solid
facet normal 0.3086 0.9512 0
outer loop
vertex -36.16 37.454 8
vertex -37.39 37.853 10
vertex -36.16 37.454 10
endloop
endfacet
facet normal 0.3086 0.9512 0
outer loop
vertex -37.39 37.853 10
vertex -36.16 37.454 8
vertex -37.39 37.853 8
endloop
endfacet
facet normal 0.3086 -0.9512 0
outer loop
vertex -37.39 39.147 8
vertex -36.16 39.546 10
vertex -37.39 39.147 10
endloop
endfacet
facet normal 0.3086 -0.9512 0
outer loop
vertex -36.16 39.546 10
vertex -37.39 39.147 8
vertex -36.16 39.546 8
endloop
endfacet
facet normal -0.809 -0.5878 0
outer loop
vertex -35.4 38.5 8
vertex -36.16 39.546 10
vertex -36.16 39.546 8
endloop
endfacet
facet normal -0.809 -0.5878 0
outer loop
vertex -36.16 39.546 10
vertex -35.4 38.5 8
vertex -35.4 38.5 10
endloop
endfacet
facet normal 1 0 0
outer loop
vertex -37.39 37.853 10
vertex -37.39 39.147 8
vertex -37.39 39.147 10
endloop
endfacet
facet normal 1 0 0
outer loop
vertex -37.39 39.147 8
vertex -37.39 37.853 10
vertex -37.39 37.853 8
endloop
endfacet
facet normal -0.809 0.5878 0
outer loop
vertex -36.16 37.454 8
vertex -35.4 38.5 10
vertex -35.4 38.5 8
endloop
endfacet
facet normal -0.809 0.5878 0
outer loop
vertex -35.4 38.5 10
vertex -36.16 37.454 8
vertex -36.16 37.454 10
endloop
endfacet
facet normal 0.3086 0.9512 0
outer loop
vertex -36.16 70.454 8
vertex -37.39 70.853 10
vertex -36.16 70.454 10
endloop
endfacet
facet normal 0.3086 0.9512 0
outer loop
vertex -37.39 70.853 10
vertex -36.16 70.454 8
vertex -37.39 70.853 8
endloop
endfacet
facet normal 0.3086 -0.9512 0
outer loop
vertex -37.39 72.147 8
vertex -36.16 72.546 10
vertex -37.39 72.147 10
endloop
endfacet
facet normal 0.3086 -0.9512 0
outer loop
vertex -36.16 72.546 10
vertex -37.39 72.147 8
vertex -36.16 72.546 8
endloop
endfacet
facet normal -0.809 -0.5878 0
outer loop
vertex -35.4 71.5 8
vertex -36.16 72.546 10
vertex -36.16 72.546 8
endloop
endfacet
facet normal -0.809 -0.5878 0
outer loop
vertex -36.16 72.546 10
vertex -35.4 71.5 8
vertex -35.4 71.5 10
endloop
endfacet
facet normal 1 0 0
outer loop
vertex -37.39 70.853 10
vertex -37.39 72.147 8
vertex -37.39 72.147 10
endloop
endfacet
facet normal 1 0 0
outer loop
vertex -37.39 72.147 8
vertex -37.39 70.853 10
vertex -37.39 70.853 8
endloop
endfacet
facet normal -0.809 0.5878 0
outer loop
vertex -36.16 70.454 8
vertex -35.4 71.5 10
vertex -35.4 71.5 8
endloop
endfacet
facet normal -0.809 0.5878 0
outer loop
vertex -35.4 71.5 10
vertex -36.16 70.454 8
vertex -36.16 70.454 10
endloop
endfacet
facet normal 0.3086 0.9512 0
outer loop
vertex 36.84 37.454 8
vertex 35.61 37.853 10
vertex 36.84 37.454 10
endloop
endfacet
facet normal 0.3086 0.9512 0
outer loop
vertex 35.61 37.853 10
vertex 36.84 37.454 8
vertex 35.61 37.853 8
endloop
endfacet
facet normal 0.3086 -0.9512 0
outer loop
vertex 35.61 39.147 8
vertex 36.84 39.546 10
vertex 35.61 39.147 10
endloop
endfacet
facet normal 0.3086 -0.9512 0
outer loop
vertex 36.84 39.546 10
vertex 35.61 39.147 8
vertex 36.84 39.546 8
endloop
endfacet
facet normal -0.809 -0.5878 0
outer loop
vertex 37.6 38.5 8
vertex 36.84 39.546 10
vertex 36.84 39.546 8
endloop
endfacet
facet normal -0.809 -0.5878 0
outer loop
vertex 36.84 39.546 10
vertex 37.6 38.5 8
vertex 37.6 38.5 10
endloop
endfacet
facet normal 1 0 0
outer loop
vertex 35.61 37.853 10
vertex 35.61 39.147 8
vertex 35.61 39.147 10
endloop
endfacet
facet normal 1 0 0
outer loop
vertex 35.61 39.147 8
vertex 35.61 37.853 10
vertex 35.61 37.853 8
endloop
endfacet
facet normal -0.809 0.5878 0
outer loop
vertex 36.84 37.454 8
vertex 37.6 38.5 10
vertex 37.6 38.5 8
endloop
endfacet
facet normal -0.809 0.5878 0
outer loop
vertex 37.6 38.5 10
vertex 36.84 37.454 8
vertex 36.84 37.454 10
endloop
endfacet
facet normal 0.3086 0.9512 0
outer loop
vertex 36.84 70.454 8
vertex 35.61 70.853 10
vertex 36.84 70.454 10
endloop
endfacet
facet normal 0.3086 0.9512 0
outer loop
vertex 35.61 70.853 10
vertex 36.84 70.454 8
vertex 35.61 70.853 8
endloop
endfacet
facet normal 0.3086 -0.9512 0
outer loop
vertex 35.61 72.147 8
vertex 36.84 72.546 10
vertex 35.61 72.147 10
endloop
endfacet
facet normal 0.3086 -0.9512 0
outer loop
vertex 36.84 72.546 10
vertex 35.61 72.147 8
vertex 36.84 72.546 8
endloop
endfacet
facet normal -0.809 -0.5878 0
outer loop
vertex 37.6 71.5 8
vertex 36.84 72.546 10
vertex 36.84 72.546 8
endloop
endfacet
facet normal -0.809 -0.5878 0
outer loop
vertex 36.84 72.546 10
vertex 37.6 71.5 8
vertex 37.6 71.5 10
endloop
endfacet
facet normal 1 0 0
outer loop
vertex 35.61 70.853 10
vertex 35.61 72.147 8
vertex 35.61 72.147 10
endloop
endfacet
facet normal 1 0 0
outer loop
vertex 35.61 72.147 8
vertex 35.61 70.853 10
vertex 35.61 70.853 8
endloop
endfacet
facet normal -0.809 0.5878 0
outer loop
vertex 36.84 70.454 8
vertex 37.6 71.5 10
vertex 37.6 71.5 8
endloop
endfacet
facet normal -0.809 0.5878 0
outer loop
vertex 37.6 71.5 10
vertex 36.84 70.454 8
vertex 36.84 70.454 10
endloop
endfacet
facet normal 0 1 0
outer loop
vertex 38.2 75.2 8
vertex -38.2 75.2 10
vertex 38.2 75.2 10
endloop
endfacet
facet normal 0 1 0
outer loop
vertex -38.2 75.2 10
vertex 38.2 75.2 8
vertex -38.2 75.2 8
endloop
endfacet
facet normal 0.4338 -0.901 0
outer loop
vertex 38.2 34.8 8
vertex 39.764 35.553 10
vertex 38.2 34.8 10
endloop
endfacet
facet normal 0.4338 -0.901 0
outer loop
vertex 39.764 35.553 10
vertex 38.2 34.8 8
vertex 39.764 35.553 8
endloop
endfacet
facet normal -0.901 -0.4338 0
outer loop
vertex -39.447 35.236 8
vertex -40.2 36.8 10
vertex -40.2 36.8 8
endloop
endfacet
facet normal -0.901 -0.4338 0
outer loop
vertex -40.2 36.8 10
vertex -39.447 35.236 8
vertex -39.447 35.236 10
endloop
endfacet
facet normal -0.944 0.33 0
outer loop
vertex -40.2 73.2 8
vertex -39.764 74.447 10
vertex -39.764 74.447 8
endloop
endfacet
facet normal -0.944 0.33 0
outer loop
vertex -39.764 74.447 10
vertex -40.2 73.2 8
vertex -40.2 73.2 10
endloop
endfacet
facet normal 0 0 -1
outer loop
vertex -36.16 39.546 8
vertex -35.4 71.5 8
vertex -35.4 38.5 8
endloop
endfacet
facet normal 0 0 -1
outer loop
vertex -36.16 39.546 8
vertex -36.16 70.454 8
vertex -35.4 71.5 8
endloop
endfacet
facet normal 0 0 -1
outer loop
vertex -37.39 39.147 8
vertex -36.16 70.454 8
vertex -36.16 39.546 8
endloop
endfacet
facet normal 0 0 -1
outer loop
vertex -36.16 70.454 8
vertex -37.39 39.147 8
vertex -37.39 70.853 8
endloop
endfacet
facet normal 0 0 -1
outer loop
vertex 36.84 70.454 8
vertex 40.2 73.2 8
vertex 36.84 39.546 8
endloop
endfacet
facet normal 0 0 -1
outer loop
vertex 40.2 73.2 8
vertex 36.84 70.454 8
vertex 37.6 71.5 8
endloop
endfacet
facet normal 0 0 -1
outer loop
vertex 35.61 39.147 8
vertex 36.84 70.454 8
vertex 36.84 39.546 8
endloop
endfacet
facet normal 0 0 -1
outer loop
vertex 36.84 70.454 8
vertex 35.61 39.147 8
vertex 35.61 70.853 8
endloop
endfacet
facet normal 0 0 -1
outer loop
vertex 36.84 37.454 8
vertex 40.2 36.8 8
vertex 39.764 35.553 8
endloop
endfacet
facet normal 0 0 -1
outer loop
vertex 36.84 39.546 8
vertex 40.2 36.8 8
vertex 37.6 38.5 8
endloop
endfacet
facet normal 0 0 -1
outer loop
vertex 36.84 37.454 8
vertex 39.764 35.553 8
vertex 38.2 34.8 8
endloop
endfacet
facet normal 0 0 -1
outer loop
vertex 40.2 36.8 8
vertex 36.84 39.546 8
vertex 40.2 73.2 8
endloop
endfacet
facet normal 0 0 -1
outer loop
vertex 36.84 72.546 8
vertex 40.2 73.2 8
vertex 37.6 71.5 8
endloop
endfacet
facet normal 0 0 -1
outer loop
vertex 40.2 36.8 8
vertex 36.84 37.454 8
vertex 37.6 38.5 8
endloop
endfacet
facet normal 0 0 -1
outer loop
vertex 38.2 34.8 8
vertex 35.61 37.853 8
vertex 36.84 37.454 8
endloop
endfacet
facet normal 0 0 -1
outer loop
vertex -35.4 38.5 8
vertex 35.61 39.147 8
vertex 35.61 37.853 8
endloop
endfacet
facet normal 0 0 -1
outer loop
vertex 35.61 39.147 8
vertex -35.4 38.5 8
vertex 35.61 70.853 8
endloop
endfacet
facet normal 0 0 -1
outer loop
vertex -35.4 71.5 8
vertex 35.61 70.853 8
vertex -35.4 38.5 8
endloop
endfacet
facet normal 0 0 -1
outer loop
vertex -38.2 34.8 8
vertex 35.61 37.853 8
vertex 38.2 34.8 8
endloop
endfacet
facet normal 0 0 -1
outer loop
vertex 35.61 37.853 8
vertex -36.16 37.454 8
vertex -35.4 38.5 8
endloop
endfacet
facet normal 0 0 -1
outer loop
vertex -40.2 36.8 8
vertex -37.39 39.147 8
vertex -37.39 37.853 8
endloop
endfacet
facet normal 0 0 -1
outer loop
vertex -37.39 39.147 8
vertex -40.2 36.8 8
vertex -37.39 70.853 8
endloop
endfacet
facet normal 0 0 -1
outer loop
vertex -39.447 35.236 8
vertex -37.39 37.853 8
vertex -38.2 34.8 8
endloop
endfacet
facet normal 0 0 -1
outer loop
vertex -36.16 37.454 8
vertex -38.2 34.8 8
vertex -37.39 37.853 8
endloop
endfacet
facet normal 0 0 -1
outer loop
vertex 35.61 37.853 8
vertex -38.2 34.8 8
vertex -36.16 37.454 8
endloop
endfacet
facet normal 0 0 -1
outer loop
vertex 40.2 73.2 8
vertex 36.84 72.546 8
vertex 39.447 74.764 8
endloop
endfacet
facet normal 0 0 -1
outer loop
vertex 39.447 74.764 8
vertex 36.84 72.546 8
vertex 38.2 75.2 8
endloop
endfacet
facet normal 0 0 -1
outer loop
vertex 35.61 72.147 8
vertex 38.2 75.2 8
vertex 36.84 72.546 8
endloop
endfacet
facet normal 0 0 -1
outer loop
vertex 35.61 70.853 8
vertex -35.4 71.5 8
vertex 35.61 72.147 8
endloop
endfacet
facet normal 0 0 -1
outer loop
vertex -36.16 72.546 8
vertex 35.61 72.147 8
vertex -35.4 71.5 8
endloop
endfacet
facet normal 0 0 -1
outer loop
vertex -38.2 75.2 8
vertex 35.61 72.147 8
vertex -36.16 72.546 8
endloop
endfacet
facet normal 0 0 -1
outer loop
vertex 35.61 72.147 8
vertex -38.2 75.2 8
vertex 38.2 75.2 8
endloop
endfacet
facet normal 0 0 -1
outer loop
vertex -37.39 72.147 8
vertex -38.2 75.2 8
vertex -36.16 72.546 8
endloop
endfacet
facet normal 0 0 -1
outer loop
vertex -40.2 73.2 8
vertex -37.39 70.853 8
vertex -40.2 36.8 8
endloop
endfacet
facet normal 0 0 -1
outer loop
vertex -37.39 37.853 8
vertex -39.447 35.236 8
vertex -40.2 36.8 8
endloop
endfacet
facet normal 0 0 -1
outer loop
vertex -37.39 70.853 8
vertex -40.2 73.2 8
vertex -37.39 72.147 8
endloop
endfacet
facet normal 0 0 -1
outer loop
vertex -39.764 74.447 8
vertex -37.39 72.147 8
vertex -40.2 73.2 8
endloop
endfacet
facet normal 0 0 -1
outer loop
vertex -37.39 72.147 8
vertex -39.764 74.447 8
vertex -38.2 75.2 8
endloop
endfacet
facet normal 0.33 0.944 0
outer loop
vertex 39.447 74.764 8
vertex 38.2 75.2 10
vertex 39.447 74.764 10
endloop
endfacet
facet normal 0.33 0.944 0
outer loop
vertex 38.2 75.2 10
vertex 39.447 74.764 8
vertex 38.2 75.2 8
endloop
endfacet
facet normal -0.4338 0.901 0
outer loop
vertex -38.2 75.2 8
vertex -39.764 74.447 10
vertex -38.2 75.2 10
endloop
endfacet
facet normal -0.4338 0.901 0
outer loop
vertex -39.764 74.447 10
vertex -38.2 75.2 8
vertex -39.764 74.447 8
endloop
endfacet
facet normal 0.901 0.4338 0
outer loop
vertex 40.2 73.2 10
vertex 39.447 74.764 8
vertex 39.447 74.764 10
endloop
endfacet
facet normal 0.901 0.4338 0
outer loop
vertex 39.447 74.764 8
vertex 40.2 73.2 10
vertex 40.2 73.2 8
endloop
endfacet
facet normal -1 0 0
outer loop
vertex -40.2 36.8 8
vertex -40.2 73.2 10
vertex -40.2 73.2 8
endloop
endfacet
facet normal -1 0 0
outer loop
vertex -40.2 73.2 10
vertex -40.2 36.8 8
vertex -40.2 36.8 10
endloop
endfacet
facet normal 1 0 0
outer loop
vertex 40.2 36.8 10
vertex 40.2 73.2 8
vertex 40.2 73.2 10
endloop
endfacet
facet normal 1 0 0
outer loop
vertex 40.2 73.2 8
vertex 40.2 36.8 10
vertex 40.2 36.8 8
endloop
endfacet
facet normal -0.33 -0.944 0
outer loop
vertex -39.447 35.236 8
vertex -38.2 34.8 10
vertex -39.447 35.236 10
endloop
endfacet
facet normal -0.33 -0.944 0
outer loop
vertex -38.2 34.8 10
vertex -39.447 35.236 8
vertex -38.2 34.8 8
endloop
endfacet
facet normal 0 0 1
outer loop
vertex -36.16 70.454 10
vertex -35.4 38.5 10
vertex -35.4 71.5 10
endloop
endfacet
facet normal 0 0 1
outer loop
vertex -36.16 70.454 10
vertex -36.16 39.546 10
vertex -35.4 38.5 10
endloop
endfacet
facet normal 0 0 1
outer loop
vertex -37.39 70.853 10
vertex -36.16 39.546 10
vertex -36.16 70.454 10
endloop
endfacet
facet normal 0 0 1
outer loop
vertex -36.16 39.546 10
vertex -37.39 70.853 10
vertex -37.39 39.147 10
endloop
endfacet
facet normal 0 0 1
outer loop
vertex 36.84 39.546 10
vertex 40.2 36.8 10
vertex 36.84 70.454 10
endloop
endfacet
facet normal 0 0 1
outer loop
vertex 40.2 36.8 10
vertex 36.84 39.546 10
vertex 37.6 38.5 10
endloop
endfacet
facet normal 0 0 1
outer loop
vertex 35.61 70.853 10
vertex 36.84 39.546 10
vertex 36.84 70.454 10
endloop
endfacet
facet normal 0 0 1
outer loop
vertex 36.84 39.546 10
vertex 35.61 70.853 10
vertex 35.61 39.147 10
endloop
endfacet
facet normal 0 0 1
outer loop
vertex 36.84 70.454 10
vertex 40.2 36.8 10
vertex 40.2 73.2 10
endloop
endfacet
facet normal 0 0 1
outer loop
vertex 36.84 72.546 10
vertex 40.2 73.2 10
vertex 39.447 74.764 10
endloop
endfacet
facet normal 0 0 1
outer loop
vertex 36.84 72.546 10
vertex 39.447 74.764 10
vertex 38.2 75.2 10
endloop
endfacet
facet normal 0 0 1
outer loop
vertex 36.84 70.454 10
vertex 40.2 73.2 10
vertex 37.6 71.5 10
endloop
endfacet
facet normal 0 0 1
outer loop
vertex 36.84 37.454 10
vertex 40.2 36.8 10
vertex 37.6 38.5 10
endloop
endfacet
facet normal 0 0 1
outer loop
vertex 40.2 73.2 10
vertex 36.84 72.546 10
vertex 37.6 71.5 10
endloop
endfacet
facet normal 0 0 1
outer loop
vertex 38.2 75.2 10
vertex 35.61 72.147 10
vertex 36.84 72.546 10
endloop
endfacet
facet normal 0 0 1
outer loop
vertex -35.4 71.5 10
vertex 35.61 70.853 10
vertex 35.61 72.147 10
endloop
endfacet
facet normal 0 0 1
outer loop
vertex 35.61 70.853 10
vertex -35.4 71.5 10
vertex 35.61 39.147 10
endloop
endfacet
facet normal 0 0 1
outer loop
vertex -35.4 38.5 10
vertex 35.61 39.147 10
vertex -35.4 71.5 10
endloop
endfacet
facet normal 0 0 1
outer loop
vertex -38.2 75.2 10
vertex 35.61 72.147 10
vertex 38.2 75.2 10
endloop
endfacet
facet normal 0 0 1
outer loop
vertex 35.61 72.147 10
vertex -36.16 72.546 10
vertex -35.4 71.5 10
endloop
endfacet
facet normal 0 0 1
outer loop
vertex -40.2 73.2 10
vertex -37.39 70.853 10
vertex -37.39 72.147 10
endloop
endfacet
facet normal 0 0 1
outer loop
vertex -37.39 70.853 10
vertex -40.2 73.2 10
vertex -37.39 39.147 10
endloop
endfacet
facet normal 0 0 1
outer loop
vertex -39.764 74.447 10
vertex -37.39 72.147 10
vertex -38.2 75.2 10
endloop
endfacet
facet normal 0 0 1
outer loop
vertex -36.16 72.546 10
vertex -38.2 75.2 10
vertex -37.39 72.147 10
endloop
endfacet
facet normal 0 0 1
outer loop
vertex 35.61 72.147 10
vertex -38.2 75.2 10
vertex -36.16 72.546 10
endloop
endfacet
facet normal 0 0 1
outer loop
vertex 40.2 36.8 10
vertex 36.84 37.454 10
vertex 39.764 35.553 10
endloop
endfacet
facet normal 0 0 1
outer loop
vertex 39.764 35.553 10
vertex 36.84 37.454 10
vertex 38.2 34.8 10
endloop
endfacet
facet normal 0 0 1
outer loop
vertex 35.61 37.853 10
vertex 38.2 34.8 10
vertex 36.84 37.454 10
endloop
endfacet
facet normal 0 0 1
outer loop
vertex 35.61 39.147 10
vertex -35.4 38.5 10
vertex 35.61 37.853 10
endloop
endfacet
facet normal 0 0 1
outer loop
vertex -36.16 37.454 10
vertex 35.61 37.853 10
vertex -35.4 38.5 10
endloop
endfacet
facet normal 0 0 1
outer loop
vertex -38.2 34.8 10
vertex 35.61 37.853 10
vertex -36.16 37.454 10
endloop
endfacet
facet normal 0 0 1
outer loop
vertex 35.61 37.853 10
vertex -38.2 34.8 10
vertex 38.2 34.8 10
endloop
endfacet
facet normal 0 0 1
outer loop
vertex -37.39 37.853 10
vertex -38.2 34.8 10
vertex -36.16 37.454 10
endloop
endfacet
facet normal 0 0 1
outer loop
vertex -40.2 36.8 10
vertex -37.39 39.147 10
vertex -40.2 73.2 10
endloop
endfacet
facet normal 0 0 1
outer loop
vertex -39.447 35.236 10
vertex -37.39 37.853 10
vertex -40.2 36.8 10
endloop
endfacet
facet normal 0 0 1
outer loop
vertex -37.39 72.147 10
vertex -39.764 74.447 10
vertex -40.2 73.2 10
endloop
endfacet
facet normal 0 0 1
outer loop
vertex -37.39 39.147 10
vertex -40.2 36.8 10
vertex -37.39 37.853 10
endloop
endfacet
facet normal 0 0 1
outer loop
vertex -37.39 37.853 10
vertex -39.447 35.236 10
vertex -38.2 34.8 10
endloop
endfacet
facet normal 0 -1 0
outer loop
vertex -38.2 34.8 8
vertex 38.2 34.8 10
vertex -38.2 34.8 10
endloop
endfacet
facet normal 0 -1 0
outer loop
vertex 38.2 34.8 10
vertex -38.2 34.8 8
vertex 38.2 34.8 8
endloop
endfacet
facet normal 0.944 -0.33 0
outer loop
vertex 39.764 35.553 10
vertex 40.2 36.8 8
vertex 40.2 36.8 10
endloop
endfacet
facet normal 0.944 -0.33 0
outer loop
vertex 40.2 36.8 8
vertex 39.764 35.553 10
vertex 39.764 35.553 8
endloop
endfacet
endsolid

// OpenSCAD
/*[Station]*/
rows=2;
columns=1;
// Could be made thinner but then you should add legs. Make sure the total height/thickness is 9 or more or else the switches will touch the ground.
caseThickness=9;
switch="MX"; // ["MX","ALPS"]
showSwitch=false;

/*[Legs]*/
legs=false;
legWidth=3;
legLength=3;
legHeight=6;

/*[Puzzle]*/
puzzle=false;
leftPuzzle=true;
rightPuzzle=true;
frontPuzzle=true;
backPuzzle=true;



/*[Danger zone]*/
// Measured from key cap center to key cap center
space=19.04;
plateLength=space*1.089;

/*[MX settings]*/
MX_cutXSize=14;
MX_cutYSize=15;
MX_notchX=4;
MX_notchY=0.50;

/*[ALPS settings]*/
ALPS_cutXSize=12.8;
ALPS_cutYSize=16.0;

function legZ(thickness,legHeight) = -(thickness*0.5+legHeight*0.5);

module MXSwitch(){
	// Awesome Cherry MX model created by gcb
	// Lib: Cherry MX switch - reference
	// Download here: https://www.thingiverse.com/thing:421524
	//  p=cherrySize/2+0.53;
	translate([0,0,13.2])
  rotate([0,0,-90])
		import("switch_mx.stl");
}

module ALPSSwitch(){
  // ALPS model created by qwelyt (me)
  // Lib: ALPS switch - reference
  // Download here: https://www.thingiverse.com/thing:3829342
  translate([0,0,-2])
  rotate([0,0,0])
  import("ALPS-switch.stl");
}

module leg(){
  cube([legWidth,legLength,legHeight],center=true);
}


module legs(thickness,rows,cols, row, col){
  x=(space*0.5-legWidth*0.5);
  y=(plateLength*0.5-legLength*0.5);
  z=legZ(thickness,legHeight);
  
  translate([0,0,0])translate([-x,-y,z])leg();
  translate([space*rows,0,0])translate([x,-y,z])leg();
  translate([0,space*cols,0])translate([-x,y,z])leg();
  translate([space*rows,space*cols,0])translate([x,y,z])leg();
  
}

module KeyPlate(w=space,l=plateLength,h=caseThickness,center=true){
	cube([w,l,h],center=center);
}

module MXCut(thickness,x,y,MX_notchX,MX_notchY){
  union(){
    difference(){
      cube([x,y,thickness+2],center=true);
      
      translate([0,y/2,0])
      cube([MX_notchX,MX_notchY,thickness+3],center=true);
      
      translate([0,-y/2,0])
      cube([MX_notchX,MX_notchY,thickness+3],center=true);
    }
  }
}

module ALPSCut(thickness){
  cube([ALPS_cutXSize,ALPS_cutYSize,thickness+2],center=true);
}

module puzzleCut(thickness,hook){
  size = hook ? 9 : 10;
  move = hook ? 1 : 0;
  difference(){
    translate([0,0,0])rotate([0,0,45])cube([size,size,thickness],center=true);
    
    translate([0,size*0.4,0])cube([size*2,size,thickness+2],center=true);
    
    translate([0,-((size*0.8)+move),0])cube([size*2,size,thickness+2],center=true);
  }
}

module plate(){
   union(){
    for(r=[0:rows-1]){
      for(c=[0:columns-1]){
        translate([space*r, space*c,0]){
          difference(){
            KeyPlate();
            if(switch == "MX"){
              MXCut(caseThickness,MX_cutXSize,MX_cutYSize,MX_notchX,MX_notchY*2);
            } else if(switch == "ALPS"){
              ALPSCut(caseThickness);
            } else {
              cube([space*0.8,space*0.8,caseThickness+2],center=true);
            }
          }
          if(showSwitch){
            if(switch == "MX"){
              #translate([0,0,caseThickness/2])MXSwitch();
            } else if(switch == "ALPS"){
              #translate([0,0,caseThickness/2])ALPSSwitch();
            } else {
              #translate([0,0,caseThickness/2])
              cube([space*0.8,space*0.8,caseThickness+2],center=true);
            }
          }
          
          
        }
      }
    }
  }
}

module build_swithes(){
  union(){
    if(puzzle){
      difference(){
        plate();
        if(backPuzzle){
          translate([0,-space*0.39,0])puzzleCut(caseThickness+2,false);
          
          translate([space*(rows-1),-space*0.39,0])puzzleCut(caseThickness+2,false);
        }
    
        if(rightPuzzle){
          translate([-space*0.346,0,0])rotate([0,0,-90])puzzleCut(caseThickness+2,false);
          
          translate([-space*0.346,space*(cols-1),0])rotate([0,0,-90])puzzleCut(caseThickness+2,false);
        }
      }
      
      if(frontPuzzle){
        translate([0,space*cols-space*0.3,0])puzzleCut(caseThickness,true);
        
        translate([space*(rows-1),space*cols-space*0.3,0])puzzleCut(caseThickness,true);
      }
      
      if(leftPuzzle){
        translate([space*rows-space*0.35,0,0])rotate([0,0,-90])puzzleCut(caseThickness,true);
        
        translate([space*rows-space*0.35,space*(cols-1),0])rotate([0,0,-90])puzzleCut(caseThickness,true);
      }
      
    } else {
      plate();
    }
 
    if(legs){
      legs(caseThickness,rows-1,cols-1,0,0);
    }
  }
}




case_w = 85;
case_h = 45;
case_d = 20;
wall = 2;
r = 4;

module rounded_cube(size=[70,40,20], r=4) {
    minkowski() {
        cube([
            size[0] - 2*r,
            size[1] - 2*r,
            size[2] - 2*r
        ], center=true);
        sphere(r=r);
    }
}

module hollow_body() {
    difference() {
        rounded_cube([case_w, case_h, case_d], r);

        translate([0,0,-wall])
            rounded_cube([
                case_w - 2*wall,
                case_h - 2*wall,
                case_d
            ], max(r-wall,1));
    }
}

module switch_holes_only() {
    for(rw=[0:rows-1]) {
        for(cl=[0:columns-1]) {
            translate([space*rw, space*cl, 6])
                MXCut(caseThickness + 4,
                      MX_cutXSize,
                      MX_cutYSize,
                      MX_notchX,
                      MX_notchY*2);
        }
    }
}

// ---------- Feather mount ----------
feather_w = 22.86;
feather_l = 50.8;
feather_hole_d = 2.6;      // clearance for M2-ish screw, tweak if needed
standoff_d = 5.5;
standoff_h = 12;
standoff_z = -case_d/2 + wall + standoff_h/2;

// Approximate mounting hole positions.
// Tune after a print if needed.
feather_hole_x = feather_l/2 - 2.54;
feather_hole_y = feather_w/2 - 2.54;

// Place Feather lengthwise in the case.
// Shift if USB is not aligned.
feather_x_offset = 2;
feather_y_offset = 0;

module feather_standoff(x, y) {
    translate([x + feather_x_offset, y + feather_y_offset, standoff_z])
    difference() {
        cylinder(h=standoff_h, d=standoff_d, center=true);
        cylinder(h=standoff_h + 1, d=feather_hole_d, center=true);
    }
}

module feather_mounts() {
    feather_standoff(-feather_hole_x, -feather_hole_y);
    feather_standoff( feather_hole_x, -feather_hole_y);
    feather_standoff(-feather_hole_x,  feather_hole_y);
    feather_standoff( feather_hole_x,  feather_hole_y);
}




// ---------- Lid screw mounts ----------
lid_screw_d = 2.2;       // hole in lid, clearance for M2
boss_hole_d = 1.6;       // pilot hole in case boss for M2 self-tapper
boss_d = 5.5;
boss_h = 17;

screw_x = case_w/2 - 6;
screw_y = case_h/2 - 6;

module screw_positions() {
    for (x=[-screw_x, screw_x])
    for (y=[-screw_y, screw_y])
        translate([x,y,0])
            children();
}

module case_screw_bosses() {
    screw_positions()
        translate([0,0,-case_d/2 + wall + boss_h/2])
        difference() {
            cylinder(h=boss_h, d=boss_d, center=true);
            cylinder(h=boss_h + 1, d=boss_hole_d, center=true);
        }
}

module lid_screw_holes() {
    screw_positions()
        cylinder(h=lid_thick + 1, d=lid_screw_d, center=true);
}


// ---------- USB slot ----------
// Micro USB on short end of HUZZAH32.
// Increase width/height if your cable plug is chunky.
usb_slot_w = 12;
usb_slot_h = 8;
usb_slot_z = -1;
usb_slot_x = case_w/2;

module usb_slot() {
    translate([usb_slot_x, feather_y_offset, usb_slot_z])
        cube([wall + 4, usb_slot_w, usb_slot_h], center=true);
}

module shell() {
    difference() {
        union() {
    hollow_body();

    translate([0,0,5])
        build_swithes();

    translate([0,-4,5])
        feather_mounts();

    case_screw_bosses();
}

        // cut only switch holes
        switch_holes_only();

        // clearance below switches
        translate([space/2, 0, -1])
            cube([space*1.8, plateLength*0.8, 10], center=true);

        // USB access slot on short edge
        translate([0,0,-2.5])usb_slot();
    }
}



// ---------- Lid ----------
lid_thick = 2;
lid_clearance = 0.6;   // increase if too tight
lid_r = r - wall;      // matches inner corner radius

lid_w = case_w - 2*wall - lid_clearance;
lid_h = case_h - 2*wall - lid_clearance;

module rounded_rect_2d(w, h, rad) {
    offset(r=rad)
        square([w - 2*rad, h - 2*rad], center=true);
}

module lid() {
    difference() {
        linear_extrude(height=lid_thick, center=true)
            rounded_rect_2d(lid_w, lid_h, lid_r);

        lid_screw_holes();
    }
}


//shell();

translate([0, 0, -case_d/2 + lid_thick/2])
translate([0,55,18])lid();
